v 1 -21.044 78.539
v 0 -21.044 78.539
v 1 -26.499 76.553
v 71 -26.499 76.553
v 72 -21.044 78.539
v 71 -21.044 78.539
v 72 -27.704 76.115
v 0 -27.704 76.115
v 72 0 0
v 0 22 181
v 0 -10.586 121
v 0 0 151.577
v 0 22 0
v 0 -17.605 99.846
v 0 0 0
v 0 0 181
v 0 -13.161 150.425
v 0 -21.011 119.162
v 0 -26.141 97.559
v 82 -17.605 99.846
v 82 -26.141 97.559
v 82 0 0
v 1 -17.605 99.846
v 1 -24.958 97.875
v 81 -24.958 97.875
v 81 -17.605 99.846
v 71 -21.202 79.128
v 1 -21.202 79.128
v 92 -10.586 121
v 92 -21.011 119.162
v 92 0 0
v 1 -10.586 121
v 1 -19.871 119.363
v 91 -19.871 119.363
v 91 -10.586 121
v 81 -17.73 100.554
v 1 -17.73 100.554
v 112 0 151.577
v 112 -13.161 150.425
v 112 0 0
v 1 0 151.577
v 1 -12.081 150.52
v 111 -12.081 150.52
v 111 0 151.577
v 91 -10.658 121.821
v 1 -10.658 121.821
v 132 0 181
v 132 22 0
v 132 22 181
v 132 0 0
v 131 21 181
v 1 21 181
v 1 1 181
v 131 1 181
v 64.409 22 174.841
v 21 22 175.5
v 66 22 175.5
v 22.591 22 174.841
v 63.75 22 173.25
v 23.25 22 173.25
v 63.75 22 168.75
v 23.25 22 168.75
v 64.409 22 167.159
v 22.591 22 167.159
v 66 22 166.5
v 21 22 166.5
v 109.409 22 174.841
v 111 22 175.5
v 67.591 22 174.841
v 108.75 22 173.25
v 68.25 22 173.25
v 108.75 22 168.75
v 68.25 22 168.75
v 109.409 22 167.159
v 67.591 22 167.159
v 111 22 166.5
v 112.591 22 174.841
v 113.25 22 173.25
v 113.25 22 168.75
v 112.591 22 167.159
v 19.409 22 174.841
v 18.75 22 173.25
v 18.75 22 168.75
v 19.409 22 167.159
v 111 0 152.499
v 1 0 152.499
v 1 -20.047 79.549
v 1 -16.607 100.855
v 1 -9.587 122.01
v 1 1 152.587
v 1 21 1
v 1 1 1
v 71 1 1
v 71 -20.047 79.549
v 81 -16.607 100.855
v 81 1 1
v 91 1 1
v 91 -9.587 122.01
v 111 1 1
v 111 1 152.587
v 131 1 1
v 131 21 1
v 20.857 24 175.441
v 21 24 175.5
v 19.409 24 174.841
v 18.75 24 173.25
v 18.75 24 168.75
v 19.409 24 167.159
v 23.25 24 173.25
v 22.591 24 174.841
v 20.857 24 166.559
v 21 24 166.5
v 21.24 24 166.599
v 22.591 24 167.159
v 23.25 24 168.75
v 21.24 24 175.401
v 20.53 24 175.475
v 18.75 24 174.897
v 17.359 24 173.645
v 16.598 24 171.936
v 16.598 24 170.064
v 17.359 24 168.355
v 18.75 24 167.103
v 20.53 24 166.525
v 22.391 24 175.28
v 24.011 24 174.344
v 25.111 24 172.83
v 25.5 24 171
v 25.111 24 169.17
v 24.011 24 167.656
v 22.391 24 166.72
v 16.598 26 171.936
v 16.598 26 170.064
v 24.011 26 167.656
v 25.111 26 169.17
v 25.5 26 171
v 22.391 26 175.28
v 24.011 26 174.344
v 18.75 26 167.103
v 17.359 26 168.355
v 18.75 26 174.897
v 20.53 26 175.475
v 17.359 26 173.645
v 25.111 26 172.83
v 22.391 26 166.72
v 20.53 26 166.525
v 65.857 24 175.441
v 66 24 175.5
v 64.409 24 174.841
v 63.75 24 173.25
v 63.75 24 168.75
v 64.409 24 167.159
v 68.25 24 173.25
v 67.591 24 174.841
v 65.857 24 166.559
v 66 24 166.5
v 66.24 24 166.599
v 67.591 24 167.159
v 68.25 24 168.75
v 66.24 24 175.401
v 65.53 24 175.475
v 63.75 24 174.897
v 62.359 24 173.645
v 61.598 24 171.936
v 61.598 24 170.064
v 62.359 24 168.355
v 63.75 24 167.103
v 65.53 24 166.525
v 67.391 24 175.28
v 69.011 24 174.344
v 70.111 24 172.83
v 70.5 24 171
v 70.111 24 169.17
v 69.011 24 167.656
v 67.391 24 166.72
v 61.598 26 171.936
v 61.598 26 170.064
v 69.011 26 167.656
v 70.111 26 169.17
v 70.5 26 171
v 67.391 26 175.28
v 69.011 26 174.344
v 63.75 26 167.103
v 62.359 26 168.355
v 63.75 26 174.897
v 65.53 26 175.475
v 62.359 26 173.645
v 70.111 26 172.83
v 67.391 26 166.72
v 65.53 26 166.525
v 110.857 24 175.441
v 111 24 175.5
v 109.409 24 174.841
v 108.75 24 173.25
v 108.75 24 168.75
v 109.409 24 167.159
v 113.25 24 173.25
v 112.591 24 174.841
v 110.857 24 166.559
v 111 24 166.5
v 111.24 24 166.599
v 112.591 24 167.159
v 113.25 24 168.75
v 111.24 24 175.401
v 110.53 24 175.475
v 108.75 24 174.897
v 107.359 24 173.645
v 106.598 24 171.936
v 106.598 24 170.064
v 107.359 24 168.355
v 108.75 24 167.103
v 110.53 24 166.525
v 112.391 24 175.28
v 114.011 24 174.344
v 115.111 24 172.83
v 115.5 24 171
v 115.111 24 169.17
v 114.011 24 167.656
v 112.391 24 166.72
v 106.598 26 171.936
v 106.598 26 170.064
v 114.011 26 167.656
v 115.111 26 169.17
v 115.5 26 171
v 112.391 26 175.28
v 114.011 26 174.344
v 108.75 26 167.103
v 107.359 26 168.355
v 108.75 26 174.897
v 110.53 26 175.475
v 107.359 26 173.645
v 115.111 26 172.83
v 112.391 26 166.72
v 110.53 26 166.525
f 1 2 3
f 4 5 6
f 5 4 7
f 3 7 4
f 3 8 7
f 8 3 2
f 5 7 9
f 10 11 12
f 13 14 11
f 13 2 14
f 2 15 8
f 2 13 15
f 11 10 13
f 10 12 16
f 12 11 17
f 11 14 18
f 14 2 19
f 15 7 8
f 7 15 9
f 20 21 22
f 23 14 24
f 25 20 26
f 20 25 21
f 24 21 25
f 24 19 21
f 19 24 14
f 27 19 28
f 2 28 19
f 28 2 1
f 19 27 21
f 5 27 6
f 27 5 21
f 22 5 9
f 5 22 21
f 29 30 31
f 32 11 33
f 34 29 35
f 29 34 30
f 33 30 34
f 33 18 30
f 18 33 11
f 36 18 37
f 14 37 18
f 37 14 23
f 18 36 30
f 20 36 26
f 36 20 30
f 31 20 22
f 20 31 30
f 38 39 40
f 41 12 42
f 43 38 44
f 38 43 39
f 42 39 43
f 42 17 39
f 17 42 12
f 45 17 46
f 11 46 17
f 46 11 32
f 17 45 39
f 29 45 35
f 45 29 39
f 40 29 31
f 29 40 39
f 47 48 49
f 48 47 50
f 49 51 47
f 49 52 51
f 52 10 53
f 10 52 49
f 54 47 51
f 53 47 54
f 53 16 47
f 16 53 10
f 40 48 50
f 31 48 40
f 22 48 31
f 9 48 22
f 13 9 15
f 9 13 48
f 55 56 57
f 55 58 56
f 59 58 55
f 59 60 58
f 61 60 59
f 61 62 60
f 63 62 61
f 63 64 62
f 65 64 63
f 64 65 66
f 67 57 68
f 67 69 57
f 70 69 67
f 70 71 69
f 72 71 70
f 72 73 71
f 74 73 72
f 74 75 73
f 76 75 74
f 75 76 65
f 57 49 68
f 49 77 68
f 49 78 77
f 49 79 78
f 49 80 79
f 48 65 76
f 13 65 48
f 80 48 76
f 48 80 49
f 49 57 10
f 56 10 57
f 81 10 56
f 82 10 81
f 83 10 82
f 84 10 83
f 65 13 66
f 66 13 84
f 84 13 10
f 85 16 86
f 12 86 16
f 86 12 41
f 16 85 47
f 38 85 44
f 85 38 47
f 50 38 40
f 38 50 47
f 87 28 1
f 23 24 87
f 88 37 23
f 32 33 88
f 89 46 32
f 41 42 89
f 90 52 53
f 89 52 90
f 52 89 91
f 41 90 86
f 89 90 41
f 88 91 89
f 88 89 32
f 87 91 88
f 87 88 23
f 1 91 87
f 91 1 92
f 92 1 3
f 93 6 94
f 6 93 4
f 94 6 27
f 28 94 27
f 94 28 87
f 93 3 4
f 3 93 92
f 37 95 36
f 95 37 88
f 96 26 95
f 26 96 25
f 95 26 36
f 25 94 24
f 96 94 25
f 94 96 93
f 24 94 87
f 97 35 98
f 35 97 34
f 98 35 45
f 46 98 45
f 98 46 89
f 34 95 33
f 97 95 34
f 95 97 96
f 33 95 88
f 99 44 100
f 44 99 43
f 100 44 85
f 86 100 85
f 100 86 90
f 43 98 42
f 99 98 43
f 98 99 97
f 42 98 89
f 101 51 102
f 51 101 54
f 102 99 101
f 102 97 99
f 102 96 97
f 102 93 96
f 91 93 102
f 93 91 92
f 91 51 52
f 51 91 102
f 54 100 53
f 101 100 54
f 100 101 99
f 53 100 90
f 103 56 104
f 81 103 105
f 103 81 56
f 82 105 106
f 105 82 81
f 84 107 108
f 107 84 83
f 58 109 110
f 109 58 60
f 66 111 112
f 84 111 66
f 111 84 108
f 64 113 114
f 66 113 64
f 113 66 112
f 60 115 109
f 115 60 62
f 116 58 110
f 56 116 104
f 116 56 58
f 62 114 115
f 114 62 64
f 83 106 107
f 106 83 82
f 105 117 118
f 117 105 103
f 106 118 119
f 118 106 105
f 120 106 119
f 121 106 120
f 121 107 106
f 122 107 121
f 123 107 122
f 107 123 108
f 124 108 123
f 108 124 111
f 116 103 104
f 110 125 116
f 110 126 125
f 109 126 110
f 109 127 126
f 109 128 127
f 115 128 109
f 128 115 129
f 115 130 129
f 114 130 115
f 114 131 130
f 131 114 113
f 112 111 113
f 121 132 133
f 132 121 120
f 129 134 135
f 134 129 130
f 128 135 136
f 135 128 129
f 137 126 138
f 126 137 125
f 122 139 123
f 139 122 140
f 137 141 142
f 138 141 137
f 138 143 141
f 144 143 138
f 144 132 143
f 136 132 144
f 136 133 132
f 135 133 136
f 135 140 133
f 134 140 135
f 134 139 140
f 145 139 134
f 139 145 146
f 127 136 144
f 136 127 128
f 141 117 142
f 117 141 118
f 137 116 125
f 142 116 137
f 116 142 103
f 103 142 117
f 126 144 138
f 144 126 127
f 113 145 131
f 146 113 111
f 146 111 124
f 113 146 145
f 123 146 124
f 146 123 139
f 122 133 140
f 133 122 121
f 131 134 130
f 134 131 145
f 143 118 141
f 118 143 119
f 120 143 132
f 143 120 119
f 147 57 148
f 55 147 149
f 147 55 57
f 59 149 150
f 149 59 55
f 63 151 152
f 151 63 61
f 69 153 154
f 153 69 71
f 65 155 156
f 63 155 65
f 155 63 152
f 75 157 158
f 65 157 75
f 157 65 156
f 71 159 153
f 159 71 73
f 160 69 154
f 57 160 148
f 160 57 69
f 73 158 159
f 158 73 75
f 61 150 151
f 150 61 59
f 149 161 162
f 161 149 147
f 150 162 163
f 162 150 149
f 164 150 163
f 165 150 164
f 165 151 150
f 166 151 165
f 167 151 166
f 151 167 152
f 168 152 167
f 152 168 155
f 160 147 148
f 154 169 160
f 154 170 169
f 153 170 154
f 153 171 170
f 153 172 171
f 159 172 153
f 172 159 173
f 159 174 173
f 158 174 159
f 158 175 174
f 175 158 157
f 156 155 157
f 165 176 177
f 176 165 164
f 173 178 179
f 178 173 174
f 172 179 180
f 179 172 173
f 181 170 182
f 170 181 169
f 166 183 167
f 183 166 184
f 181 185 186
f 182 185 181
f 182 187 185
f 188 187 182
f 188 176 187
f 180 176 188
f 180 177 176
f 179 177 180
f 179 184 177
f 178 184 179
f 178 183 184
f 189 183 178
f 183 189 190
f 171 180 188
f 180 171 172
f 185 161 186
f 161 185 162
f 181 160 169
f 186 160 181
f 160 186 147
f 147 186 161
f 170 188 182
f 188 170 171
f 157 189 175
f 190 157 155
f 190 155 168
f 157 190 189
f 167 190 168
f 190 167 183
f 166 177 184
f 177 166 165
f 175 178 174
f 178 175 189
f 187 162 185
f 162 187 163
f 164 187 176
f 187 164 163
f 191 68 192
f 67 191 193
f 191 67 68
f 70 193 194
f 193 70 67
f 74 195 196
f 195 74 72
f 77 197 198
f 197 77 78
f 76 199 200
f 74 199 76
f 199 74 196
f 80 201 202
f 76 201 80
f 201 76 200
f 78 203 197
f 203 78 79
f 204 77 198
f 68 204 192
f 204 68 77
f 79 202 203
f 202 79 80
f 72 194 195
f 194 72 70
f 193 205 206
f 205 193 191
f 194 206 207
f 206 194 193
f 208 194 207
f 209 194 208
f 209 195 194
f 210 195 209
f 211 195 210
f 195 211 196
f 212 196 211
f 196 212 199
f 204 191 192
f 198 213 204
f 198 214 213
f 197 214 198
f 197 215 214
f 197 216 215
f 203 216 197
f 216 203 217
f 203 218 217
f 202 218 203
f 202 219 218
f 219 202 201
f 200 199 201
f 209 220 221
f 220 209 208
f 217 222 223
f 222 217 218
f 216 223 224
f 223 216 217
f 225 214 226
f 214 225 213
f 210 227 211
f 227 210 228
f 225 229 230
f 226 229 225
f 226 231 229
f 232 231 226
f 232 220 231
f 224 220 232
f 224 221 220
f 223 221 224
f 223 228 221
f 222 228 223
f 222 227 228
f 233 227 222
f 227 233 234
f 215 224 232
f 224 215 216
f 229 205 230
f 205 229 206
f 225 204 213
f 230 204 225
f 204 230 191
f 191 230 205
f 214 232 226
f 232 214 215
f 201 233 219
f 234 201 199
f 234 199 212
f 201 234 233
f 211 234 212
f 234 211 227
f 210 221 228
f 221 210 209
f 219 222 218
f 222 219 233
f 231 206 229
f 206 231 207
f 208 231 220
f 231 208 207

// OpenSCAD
// file: peg.scad
pegSlot = 5; // the small opening it slides into
pegD = 9;    // the large opening to put it into
pegH = 22;   // top of large opening to bottom of small opening

holeD = 3.75; // "screw" holes

holeSpacingX = 15;
holeSpacingY = 14.5; // yes, this is actually not a grid. go figure
pegSpacingX = 3 * holeSpacingX;
pegSpacingY = 4 * holeSpacingY;

module peg(t = 2, clearance = 2)
{
    D = pegD;
    d = 4.5;

    rotate([ -90, 0, 0 ])
    {
        hull()
        {
            translate([ 0, (D - d) / 2, 0 ]) cylinder(h = clearance, d = d);
            translate([ 0, -(D - d) / 2, 0 ]) cylinder(h = clearance, d = d);
        }
        translate([ 0, 0, clearance ]) cylinder(h = t, d = D);
    }
}

module pegs(n, t = 2, clearance = 2)
{
    pegSpacingX = 45;
    x0 = ((1 - n) * pegSpacingX) / 2;
    for (i = [0:(n - 1)])
    {
        translate([ x0 + i * pegSpacingX, 0, 0 ]) peg(t, clearance);
    }
}
// main file
include<peg.scad>;

sizes = [ [ 60, 80 ], [ 70, 100 ], [ 80, 120 ], [ 100, 150 ], [ 120, 180 ] ];

margin = 10;
angle = 5;
thickness = 1;

width = 20;

box();
module box(t = thickness)
{
    L = 2 * t + margin + sizes[len(sizes) - 1][0];
    H = t + sizes[len(sizes) - 1][1];
    W = 2 * t + width;
    echo(W);
    difference()
    {
        union()
        {
            cube([ L, W, H ]);
            for (i = [0:len(sizes) - 2])
            {
                bagH = t + sizes[i][1];
                rotate([angle*(len(sizes)-i-1), 0, 0 ]) cube([ 2 * t + margin + sizes[i][0], W, bagH ]);
            }
        }
        translate([ t, t, t ]) cube([ L - 2 * t, W - 2 * t, H - t + .01 ]);
            for (i = [0:len(sizes) - 2])
            {
                bagH = t + sizes[i][1];
                translate([t,t,t]) rotate([ angle*(len(sizes)-1-i), 0, 0 ]) cube([margin + sizes[i][0], W - 2*t, bagH+.01 ]);
            }
    }
    translate([L/2,W,H - 10]) pegs(3);
}
